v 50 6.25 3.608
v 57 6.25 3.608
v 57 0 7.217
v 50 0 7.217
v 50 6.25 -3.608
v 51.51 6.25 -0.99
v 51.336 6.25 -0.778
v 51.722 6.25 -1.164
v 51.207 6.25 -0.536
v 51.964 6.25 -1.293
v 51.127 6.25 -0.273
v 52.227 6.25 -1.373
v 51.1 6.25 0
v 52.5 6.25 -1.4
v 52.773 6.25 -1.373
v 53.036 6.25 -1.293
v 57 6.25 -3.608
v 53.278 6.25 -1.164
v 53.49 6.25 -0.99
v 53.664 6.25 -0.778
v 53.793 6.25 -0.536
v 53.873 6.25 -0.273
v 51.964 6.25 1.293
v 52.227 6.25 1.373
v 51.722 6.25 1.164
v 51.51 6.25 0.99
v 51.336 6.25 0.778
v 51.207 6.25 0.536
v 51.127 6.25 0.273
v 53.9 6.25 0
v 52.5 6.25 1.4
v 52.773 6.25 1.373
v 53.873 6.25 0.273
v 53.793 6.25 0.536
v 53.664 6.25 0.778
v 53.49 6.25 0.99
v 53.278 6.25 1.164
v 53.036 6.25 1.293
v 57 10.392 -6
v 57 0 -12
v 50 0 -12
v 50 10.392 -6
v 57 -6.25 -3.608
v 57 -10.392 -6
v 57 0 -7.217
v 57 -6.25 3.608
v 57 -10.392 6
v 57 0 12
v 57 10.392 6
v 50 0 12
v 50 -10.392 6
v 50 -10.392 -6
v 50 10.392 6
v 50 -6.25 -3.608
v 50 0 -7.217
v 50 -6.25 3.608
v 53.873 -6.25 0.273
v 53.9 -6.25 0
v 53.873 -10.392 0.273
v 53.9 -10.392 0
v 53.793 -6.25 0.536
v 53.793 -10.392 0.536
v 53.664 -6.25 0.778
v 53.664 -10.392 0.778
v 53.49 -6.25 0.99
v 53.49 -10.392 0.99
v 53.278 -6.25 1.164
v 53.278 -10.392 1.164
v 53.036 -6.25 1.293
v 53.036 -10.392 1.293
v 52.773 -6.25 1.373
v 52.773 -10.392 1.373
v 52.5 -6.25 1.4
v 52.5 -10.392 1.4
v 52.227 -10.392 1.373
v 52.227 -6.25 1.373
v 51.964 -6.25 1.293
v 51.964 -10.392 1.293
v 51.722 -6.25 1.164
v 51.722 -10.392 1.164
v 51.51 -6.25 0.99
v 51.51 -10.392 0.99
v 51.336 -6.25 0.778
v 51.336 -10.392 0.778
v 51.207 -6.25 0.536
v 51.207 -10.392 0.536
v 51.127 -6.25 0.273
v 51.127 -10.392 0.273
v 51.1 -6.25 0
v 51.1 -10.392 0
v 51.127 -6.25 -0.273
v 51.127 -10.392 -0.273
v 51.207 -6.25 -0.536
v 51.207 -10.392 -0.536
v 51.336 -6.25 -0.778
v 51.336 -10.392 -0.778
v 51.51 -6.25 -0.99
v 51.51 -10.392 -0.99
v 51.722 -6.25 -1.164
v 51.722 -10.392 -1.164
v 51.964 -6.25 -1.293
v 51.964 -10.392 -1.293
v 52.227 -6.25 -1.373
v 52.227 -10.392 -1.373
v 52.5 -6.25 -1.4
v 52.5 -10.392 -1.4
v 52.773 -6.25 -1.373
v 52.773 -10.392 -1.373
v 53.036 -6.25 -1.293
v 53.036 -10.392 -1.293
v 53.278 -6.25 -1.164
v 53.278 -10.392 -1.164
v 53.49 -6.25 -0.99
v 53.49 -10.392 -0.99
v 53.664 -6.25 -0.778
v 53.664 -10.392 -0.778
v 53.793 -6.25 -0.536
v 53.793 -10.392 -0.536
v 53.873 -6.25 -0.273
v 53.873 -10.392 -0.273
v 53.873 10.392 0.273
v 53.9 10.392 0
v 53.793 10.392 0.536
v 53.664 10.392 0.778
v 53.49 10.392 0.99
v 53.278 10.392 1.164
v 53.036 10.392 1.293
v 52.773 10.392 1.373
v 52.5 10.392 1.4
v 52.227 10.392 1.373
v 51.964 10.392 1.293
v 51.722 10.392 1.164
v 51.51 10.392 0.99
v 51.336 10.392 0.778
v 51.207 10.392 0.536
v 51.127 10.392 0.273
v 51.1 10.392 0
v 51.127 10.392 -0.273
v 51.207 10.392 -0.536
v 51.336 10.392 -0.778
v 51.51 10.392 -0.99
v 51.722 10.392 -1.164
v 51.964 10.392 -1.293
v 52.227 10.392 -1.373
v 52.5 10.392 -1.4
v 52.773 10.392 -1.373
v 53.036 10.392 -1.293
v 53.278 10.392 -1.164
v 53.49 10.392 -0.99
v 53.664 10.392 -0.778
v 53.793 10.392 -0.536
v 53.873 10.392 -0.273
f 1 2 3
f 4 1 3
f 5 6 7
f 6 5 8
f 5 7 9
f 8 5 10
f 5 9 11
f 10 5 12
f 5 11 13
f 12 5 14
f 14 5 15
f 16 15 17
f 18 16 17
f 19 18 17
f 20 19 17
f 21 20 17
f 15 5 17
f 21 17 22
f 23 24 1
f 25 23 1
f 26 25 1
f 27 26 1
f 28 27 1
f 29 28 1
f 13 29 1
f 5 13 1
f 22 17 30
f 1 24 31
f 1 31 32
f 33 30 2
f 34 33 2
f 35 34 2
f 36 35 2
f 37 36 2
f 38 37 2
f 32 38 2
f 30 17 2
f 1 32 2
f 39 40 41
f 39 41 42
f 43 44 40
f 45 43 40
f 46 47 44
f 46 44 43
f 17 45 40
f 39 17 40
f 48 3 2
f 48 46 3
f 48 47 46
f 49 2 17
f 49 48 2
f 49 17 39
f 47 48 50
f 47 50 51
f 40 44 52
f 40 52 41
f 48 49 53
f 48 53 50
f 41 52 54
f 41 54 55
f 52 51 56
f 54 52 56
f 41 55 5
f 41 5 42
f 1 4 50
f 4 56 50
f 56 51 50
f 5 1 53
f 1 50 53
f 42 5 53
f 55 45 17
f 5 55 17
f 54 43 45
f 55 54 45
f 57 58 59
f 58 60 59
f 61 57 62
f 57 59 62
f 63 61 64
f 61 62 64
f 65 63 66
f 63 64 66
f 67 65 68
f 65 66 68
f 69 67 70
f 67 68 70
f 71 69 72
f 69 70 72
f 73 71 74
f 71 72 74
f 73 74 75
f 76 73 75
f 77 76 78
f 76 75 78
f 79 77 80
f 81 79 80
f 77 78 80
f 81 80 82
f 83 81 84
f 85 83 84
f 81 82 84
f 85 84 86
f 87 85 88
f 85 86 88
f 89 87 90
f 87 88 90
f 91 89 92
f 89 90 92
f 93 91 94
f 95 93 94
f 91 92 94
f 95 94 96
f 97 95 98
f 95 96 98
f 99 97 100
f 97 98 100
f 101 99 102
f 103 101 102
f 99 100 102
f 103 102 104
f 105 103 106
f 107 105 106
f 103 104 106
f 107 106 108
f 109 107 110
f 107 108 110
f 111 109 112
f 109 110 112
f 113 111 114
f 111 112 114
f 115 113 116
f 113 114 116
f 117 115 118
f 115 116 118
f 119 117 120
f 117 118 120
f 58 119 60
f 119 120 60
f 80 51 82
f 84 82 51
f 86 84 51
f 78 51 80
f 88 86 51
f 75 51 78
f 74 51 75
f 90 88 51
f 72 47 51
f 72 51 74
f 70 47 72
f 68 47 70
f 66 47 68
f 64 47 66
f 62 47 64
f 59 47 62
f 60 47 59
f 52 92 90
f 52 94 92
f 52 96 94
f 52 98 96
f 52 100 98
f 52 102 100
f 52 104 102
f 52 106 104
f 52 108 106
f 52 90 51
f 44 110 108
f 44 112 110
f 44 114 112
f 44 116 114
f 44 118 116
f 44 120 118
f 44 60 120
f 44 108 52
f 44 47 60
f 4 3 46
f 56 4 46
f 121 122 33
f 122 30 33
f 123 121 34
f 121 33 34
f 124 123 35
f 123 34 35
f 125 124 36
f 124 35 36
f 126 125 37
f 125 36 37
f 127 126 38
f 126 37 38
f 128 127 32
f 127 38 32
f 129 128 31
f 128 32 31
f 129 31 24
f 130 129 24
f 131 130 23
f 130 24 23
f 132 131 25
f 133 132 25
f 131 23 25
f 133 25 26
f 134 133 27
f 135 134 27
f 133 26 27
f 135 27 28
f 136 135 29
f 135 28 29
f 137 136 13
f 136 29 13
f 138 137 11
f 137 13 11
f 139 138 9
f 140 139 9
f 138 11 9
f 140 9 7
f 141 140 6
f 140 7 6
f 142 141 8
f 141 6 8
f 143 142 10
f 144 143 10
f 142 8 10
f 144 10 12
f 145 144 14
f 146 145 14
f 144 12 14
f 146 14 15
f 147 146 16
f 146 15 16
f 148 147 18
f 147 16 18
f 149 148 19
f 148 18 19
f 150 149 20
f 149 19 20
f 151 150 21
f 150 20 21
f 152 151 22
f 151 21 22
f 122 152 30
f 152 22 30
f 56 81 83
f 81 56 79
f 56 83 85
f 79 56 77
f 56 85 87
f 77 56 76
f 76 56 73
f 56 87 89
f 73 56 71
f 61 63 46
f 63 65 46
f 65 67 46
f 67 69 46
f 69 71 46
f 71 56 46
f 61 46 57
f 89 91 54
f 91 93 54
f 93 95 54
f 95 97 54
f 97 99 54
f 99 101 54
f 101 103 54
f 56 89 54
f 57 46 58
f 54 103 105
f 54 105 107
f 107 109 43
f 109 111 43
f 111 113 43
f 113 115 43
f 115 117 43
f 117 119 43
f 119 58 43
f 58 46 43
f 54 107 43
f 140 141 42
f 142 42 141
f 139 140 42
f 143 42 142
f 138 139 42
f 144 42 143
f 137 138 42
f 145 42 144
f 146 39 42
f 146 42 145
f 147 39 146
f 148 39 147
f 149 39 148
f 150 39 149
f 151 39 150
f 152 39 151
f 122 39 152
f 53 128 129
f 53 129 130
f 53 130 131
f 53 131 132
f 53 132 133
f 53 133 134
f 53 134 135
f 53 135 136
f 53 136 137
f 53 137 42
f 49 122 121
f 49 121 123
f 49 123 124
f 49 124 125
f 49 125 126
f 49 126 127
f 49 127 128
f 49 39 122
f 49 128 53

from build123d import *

# Parameters (mm, degrees)
SKETCH214_R     = 1.4
PAD127050_DEPTH = 15
PAD127042_DEPTH = 7


with BuildPart() as pad127050:
    # Sketch214 → Pad127050 (new body, symmetric)
    with BuildSketch(Plane(origin=(75, 0, 0), x_dir=(1, 0, 0), z_dir=(0, -1, 0))):
        with Locations((-22.5, 0)):
            Circle(SKETCH214_R)
    extrude(amount=PAD127050_DEPTH, both=True)


with BuildPart() as wheelcollar:
    # Sketch206 → Pad127042 (new body)
    with BuildSketch(Plane.YZ.offset(57)):
        Polygon((0, 12), (-10.392305, 6), (-10.392305, -6), (0, -12), (10.392305, -6), (10.392305, 6), align=None)
        Polygon((6.25, 3.608439), (0, 7.216878), (-6.25, 3.608439), (-6.25, -3.608439), (0, -7.216878), (6.25, -3.608439), align=None, mode=Mode.SUBTRACT)
    extrude(amount=-PAD127042_DEPTH)

    # Cut007019027: cut Pad127050
    add(pad127050.part, mode=Mode.SUBTRACT)


solid = wheelcollar.part
